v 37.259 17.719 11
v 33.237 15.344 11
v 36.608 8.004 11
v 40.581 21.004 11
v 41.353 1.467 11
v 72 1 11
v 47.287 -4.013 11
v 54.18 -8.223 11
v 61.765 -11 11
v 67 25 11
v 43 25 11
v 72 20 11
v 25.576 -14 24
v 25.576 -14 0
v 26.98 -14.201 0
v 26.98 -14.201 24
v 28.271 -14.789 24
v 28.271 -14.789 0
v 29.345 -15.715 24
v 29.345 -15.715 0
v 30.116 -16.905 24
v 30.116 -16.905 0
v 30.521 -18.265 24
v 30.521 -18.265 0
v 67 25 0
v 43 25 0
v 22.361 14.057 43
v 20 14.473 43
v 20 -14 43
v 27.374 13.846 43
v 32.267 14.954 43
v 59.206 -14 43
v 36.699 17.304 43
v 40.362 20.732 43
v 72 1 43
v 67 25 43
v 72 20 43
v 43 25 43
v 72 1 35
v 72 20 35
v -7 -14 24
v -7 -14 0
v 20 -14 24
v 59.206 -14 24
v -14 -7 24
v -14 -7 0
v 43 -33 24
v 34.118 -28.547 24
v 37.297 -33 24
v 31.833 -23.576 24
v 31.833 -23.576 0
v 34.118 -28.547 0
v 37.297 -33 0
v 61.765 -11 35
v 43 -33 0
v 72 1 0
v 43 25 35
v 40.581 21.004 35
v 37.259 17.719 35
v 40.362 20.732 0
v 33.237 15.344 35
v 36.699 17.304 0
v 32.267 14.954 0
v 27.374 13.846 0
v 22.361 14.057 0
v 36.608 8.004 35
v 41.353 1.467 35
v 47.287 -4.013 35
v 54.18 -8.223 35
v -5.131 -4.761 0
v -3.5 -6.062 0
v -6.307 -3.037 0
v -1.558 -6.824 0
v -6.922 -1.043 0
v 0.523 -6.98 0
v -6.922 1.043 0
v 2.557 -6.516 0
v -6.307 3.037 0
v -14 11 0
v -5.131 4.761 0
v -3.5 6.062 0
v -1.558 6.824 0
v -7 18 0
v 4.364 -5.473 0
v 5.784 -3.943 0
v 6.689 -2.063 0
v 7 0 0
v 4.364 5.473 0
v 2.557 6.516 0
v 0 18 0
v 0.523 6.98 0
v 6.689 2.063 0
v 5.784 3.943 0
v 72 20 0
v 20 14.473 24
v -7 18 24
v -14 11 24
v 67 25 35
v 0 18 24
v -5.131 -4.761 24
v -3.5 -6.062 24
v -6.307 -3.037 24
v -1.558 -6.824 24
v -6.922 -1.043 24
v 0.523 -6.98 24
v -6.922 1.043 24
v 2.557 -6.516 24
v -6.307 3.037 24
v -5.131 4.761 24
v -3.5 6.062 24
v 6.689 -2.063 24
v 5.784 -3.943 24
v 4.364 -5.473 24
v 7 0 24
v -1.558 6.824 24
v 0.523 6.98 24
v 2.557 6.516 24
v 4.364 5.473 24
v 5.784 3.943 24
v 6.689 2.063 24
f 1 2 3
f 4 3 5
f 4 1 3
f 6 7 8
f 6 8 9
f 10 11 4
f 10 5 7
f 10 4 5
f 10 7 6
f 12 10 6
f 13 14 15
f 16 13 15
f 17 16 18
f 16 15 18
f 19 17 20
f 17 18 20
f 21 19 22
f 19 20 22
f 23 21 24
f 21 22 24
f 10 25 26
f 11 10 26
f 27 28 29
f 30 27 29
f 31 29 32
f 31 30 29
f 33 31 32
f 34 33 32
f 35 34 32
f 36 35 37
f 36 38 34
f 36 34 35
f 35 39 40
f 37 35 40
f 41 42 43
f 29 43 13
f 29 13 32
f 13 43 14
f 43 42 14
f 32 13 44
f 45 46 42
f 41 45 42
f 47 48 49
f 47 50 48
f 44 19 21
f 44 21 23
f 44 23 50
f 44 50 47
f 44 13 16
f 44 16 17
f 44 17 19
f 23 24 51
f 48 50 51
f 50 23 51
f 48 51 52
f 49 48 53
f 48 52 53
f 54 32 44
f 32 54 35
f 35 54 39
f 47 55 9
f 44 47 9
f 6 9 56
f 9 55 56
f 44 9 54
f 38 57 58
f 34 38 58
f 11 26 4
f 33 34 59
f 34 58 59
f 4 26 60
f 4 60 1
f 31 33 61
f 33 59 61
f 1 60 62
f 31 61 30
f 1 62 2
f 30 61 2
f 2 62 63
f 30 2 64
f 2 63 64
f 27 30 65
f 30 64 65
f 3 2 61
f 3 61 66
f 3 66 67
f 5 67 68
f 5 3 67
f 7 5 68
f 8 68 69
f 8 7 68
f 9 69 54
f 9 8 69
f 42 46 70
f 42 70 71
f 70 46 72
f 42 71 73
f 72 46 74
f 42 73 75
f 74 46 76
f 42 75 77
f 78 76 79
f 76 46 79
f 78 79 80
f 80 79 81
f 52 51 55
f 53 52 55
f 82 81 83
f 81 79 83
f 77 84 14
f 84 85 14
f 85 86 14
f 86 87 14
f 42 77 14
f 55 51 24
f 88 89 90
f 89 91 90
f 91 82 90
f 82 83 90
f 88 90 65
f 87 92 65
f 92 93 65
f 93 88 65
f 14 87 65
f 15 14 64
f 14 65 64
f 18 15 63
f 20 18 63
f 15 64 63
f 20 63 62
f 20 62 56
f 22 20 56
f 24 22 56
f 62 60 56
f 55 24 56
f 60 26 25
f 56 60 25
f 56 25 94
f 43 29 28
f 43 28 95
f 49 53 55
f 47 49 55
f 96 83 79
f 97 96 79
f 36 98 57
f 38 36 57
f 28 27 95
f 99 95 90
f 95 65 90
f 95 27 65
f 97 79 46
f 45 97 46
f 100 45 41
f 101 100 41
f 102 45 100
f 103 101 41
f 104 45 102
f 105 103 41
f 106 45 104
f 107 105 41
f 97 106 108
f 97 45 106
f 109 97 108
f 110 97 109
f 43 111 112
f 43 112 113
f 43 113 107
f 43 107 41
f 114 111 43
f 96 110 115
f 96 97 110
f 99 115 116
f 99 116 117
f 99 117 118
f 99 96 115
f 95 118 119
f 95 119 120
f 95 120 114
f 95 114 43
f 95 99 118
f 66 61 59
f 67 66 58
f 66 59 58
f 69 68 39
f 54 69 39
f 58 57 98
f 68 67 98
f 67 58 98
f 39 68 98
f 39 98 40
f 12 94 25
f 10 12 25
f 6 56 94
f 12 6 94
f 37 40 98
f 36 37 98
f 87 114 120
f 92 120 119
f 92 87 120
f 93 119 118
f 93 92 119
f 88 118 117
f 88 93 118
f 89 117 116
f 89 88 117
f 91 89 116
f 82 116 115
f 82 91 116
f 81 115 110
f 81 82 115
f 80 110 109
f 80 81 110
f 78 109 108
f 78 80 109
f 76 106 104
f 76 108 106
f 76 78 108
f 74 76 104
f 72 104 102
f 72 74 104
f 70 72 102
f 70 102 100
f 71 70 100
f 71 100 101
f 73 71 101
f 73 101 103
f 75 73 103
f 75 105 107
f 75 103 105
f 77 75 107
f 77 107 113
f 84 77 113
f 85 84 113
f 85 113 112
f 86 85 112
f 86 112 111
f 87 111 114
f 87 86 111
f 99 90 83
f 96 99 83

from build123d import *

# Parameters (mm, degrees)
SKETCH_2_R          = 7
EXTRUDE_1_DEPTH     = 43
SKETCH_5_W          = 34
SKETCH_5_H          = 19
CUT_EXTRUDE_2_DEPTH = 35
SKETCH_6_W          = 62.498626105
SKETCH_6_H          = 38.983271372
CUT_EXTRUDE_3_DEPTH = 19
CUT_EXTRUDE_START   = -32
CUT_EXTRUDE_5_DEPTH = 24


with BuildPart() as part:
    # 草圖2 → 填料-伸長1 (new body)
    with BuildSketch(Plane.XY):
        with BuildLine():
            Line((-14, 11), (-14, -7))
            Line((-14, -7), (-7, -14))
            Line((-7, -14), (25.575538911, -14))
            ThreePointArc((25.575538911, -14), (28.840774692, -15.213413768), (30.521177653, -18.264705882))
            ThreePointArc((30.521177653, -18.264705882), (32.858007856, -26.115672061), (37.296980053, -33))
            Line((37.296980053, -33), (43, -33))
            Line((43, -33), (72, 1))
            Line((72, 1), (72, 20))
            Line((72, 20), (67, 25))
            Line((67, 25), (43, 25))
            ThreePointArc((43, 25), (34.561098706, 15.982044142), (22.361380836, 14.057085233))
            Line((22.361380836, 14.057085233), (0, 18))
            Line((0, 18), (-7, 18))
            Line((-7, 18), (-14, 11))
        make_face()
        Circle(SKETCH_2_R, mode=Mode.SUBTRACT)
    extrude(amount=EXTRUDE_1_DEPTH)

    # 草圖5 → 除料-伸長2 (cut, symmetric)
    with BuildSketch(Plane(origin=(0, 0, 0), x_dir=(1, 0, 0), z_dir=(0, 1, 0))):
        with Locations((3, -33.5)):
            Rectangle(SKETCH_5_W, SKETCH_5_H)
    extrude(amount=CUT_EXTRUDE_2_DEPTH, both=True, mode=Mode.SUBTRACT)

    # 草圖6 → 除料-伸長3 (cut)
    with BuildSketch(Plane.XY.offset(43)):
        with Locations((47.348473669, -33.491635686)):
            Rectangle(SKETCH_6_W, SKETCH_6_H)
    extrude(amount=-CUT_EXTRUDE_3_DEPTH, mode=Mode.SUBTRACT)

    # 草圖9 → 除料-伸長5 (cut)
    with BuildSketch(Plane.XY.offset(43).offset(CUT_EXTRUDE_START)):
        with BuildLine():
            ThreePointArc((33.236936549, 15.344294617), (44.184262982, -1.419294771), (61.764705882, -11))
            Line((61.764705882, -11), (72, 1))
            Line((72, 1), (72, 20))
            Line((72, 20), (67, 25))
            Line((67, 25), (43, 25))
            ThreePointArc((43, 25), (39.021244343, 19.259333621), (33.236936549, 15.344294617))
        make_face()
        with BuildLine():
            Line((72, 1), (61.764705882, -11))
            ThreePointArc((61.764705882, -11), (97.113272797, -3.706821839), (113, 28.701873436))
            ThreePointArc((113, 28.701873436), (65.22820561, 69.138772436), (33.236936549, 15.344294617))
            ThreePointArc((33.236936549, 15.344294617), (39.021244343, 19.259333621), (43, 25))
            Line((43, 25), (67, 25))
            Line((67, 25), (72, 20))
            Line((72, 20), (72, 1))
        make_face()
    extrude(amount=CUT_EXTRUDE_5_DEPTH, mode=Mode.SUBTRACT)


solid = part.part
